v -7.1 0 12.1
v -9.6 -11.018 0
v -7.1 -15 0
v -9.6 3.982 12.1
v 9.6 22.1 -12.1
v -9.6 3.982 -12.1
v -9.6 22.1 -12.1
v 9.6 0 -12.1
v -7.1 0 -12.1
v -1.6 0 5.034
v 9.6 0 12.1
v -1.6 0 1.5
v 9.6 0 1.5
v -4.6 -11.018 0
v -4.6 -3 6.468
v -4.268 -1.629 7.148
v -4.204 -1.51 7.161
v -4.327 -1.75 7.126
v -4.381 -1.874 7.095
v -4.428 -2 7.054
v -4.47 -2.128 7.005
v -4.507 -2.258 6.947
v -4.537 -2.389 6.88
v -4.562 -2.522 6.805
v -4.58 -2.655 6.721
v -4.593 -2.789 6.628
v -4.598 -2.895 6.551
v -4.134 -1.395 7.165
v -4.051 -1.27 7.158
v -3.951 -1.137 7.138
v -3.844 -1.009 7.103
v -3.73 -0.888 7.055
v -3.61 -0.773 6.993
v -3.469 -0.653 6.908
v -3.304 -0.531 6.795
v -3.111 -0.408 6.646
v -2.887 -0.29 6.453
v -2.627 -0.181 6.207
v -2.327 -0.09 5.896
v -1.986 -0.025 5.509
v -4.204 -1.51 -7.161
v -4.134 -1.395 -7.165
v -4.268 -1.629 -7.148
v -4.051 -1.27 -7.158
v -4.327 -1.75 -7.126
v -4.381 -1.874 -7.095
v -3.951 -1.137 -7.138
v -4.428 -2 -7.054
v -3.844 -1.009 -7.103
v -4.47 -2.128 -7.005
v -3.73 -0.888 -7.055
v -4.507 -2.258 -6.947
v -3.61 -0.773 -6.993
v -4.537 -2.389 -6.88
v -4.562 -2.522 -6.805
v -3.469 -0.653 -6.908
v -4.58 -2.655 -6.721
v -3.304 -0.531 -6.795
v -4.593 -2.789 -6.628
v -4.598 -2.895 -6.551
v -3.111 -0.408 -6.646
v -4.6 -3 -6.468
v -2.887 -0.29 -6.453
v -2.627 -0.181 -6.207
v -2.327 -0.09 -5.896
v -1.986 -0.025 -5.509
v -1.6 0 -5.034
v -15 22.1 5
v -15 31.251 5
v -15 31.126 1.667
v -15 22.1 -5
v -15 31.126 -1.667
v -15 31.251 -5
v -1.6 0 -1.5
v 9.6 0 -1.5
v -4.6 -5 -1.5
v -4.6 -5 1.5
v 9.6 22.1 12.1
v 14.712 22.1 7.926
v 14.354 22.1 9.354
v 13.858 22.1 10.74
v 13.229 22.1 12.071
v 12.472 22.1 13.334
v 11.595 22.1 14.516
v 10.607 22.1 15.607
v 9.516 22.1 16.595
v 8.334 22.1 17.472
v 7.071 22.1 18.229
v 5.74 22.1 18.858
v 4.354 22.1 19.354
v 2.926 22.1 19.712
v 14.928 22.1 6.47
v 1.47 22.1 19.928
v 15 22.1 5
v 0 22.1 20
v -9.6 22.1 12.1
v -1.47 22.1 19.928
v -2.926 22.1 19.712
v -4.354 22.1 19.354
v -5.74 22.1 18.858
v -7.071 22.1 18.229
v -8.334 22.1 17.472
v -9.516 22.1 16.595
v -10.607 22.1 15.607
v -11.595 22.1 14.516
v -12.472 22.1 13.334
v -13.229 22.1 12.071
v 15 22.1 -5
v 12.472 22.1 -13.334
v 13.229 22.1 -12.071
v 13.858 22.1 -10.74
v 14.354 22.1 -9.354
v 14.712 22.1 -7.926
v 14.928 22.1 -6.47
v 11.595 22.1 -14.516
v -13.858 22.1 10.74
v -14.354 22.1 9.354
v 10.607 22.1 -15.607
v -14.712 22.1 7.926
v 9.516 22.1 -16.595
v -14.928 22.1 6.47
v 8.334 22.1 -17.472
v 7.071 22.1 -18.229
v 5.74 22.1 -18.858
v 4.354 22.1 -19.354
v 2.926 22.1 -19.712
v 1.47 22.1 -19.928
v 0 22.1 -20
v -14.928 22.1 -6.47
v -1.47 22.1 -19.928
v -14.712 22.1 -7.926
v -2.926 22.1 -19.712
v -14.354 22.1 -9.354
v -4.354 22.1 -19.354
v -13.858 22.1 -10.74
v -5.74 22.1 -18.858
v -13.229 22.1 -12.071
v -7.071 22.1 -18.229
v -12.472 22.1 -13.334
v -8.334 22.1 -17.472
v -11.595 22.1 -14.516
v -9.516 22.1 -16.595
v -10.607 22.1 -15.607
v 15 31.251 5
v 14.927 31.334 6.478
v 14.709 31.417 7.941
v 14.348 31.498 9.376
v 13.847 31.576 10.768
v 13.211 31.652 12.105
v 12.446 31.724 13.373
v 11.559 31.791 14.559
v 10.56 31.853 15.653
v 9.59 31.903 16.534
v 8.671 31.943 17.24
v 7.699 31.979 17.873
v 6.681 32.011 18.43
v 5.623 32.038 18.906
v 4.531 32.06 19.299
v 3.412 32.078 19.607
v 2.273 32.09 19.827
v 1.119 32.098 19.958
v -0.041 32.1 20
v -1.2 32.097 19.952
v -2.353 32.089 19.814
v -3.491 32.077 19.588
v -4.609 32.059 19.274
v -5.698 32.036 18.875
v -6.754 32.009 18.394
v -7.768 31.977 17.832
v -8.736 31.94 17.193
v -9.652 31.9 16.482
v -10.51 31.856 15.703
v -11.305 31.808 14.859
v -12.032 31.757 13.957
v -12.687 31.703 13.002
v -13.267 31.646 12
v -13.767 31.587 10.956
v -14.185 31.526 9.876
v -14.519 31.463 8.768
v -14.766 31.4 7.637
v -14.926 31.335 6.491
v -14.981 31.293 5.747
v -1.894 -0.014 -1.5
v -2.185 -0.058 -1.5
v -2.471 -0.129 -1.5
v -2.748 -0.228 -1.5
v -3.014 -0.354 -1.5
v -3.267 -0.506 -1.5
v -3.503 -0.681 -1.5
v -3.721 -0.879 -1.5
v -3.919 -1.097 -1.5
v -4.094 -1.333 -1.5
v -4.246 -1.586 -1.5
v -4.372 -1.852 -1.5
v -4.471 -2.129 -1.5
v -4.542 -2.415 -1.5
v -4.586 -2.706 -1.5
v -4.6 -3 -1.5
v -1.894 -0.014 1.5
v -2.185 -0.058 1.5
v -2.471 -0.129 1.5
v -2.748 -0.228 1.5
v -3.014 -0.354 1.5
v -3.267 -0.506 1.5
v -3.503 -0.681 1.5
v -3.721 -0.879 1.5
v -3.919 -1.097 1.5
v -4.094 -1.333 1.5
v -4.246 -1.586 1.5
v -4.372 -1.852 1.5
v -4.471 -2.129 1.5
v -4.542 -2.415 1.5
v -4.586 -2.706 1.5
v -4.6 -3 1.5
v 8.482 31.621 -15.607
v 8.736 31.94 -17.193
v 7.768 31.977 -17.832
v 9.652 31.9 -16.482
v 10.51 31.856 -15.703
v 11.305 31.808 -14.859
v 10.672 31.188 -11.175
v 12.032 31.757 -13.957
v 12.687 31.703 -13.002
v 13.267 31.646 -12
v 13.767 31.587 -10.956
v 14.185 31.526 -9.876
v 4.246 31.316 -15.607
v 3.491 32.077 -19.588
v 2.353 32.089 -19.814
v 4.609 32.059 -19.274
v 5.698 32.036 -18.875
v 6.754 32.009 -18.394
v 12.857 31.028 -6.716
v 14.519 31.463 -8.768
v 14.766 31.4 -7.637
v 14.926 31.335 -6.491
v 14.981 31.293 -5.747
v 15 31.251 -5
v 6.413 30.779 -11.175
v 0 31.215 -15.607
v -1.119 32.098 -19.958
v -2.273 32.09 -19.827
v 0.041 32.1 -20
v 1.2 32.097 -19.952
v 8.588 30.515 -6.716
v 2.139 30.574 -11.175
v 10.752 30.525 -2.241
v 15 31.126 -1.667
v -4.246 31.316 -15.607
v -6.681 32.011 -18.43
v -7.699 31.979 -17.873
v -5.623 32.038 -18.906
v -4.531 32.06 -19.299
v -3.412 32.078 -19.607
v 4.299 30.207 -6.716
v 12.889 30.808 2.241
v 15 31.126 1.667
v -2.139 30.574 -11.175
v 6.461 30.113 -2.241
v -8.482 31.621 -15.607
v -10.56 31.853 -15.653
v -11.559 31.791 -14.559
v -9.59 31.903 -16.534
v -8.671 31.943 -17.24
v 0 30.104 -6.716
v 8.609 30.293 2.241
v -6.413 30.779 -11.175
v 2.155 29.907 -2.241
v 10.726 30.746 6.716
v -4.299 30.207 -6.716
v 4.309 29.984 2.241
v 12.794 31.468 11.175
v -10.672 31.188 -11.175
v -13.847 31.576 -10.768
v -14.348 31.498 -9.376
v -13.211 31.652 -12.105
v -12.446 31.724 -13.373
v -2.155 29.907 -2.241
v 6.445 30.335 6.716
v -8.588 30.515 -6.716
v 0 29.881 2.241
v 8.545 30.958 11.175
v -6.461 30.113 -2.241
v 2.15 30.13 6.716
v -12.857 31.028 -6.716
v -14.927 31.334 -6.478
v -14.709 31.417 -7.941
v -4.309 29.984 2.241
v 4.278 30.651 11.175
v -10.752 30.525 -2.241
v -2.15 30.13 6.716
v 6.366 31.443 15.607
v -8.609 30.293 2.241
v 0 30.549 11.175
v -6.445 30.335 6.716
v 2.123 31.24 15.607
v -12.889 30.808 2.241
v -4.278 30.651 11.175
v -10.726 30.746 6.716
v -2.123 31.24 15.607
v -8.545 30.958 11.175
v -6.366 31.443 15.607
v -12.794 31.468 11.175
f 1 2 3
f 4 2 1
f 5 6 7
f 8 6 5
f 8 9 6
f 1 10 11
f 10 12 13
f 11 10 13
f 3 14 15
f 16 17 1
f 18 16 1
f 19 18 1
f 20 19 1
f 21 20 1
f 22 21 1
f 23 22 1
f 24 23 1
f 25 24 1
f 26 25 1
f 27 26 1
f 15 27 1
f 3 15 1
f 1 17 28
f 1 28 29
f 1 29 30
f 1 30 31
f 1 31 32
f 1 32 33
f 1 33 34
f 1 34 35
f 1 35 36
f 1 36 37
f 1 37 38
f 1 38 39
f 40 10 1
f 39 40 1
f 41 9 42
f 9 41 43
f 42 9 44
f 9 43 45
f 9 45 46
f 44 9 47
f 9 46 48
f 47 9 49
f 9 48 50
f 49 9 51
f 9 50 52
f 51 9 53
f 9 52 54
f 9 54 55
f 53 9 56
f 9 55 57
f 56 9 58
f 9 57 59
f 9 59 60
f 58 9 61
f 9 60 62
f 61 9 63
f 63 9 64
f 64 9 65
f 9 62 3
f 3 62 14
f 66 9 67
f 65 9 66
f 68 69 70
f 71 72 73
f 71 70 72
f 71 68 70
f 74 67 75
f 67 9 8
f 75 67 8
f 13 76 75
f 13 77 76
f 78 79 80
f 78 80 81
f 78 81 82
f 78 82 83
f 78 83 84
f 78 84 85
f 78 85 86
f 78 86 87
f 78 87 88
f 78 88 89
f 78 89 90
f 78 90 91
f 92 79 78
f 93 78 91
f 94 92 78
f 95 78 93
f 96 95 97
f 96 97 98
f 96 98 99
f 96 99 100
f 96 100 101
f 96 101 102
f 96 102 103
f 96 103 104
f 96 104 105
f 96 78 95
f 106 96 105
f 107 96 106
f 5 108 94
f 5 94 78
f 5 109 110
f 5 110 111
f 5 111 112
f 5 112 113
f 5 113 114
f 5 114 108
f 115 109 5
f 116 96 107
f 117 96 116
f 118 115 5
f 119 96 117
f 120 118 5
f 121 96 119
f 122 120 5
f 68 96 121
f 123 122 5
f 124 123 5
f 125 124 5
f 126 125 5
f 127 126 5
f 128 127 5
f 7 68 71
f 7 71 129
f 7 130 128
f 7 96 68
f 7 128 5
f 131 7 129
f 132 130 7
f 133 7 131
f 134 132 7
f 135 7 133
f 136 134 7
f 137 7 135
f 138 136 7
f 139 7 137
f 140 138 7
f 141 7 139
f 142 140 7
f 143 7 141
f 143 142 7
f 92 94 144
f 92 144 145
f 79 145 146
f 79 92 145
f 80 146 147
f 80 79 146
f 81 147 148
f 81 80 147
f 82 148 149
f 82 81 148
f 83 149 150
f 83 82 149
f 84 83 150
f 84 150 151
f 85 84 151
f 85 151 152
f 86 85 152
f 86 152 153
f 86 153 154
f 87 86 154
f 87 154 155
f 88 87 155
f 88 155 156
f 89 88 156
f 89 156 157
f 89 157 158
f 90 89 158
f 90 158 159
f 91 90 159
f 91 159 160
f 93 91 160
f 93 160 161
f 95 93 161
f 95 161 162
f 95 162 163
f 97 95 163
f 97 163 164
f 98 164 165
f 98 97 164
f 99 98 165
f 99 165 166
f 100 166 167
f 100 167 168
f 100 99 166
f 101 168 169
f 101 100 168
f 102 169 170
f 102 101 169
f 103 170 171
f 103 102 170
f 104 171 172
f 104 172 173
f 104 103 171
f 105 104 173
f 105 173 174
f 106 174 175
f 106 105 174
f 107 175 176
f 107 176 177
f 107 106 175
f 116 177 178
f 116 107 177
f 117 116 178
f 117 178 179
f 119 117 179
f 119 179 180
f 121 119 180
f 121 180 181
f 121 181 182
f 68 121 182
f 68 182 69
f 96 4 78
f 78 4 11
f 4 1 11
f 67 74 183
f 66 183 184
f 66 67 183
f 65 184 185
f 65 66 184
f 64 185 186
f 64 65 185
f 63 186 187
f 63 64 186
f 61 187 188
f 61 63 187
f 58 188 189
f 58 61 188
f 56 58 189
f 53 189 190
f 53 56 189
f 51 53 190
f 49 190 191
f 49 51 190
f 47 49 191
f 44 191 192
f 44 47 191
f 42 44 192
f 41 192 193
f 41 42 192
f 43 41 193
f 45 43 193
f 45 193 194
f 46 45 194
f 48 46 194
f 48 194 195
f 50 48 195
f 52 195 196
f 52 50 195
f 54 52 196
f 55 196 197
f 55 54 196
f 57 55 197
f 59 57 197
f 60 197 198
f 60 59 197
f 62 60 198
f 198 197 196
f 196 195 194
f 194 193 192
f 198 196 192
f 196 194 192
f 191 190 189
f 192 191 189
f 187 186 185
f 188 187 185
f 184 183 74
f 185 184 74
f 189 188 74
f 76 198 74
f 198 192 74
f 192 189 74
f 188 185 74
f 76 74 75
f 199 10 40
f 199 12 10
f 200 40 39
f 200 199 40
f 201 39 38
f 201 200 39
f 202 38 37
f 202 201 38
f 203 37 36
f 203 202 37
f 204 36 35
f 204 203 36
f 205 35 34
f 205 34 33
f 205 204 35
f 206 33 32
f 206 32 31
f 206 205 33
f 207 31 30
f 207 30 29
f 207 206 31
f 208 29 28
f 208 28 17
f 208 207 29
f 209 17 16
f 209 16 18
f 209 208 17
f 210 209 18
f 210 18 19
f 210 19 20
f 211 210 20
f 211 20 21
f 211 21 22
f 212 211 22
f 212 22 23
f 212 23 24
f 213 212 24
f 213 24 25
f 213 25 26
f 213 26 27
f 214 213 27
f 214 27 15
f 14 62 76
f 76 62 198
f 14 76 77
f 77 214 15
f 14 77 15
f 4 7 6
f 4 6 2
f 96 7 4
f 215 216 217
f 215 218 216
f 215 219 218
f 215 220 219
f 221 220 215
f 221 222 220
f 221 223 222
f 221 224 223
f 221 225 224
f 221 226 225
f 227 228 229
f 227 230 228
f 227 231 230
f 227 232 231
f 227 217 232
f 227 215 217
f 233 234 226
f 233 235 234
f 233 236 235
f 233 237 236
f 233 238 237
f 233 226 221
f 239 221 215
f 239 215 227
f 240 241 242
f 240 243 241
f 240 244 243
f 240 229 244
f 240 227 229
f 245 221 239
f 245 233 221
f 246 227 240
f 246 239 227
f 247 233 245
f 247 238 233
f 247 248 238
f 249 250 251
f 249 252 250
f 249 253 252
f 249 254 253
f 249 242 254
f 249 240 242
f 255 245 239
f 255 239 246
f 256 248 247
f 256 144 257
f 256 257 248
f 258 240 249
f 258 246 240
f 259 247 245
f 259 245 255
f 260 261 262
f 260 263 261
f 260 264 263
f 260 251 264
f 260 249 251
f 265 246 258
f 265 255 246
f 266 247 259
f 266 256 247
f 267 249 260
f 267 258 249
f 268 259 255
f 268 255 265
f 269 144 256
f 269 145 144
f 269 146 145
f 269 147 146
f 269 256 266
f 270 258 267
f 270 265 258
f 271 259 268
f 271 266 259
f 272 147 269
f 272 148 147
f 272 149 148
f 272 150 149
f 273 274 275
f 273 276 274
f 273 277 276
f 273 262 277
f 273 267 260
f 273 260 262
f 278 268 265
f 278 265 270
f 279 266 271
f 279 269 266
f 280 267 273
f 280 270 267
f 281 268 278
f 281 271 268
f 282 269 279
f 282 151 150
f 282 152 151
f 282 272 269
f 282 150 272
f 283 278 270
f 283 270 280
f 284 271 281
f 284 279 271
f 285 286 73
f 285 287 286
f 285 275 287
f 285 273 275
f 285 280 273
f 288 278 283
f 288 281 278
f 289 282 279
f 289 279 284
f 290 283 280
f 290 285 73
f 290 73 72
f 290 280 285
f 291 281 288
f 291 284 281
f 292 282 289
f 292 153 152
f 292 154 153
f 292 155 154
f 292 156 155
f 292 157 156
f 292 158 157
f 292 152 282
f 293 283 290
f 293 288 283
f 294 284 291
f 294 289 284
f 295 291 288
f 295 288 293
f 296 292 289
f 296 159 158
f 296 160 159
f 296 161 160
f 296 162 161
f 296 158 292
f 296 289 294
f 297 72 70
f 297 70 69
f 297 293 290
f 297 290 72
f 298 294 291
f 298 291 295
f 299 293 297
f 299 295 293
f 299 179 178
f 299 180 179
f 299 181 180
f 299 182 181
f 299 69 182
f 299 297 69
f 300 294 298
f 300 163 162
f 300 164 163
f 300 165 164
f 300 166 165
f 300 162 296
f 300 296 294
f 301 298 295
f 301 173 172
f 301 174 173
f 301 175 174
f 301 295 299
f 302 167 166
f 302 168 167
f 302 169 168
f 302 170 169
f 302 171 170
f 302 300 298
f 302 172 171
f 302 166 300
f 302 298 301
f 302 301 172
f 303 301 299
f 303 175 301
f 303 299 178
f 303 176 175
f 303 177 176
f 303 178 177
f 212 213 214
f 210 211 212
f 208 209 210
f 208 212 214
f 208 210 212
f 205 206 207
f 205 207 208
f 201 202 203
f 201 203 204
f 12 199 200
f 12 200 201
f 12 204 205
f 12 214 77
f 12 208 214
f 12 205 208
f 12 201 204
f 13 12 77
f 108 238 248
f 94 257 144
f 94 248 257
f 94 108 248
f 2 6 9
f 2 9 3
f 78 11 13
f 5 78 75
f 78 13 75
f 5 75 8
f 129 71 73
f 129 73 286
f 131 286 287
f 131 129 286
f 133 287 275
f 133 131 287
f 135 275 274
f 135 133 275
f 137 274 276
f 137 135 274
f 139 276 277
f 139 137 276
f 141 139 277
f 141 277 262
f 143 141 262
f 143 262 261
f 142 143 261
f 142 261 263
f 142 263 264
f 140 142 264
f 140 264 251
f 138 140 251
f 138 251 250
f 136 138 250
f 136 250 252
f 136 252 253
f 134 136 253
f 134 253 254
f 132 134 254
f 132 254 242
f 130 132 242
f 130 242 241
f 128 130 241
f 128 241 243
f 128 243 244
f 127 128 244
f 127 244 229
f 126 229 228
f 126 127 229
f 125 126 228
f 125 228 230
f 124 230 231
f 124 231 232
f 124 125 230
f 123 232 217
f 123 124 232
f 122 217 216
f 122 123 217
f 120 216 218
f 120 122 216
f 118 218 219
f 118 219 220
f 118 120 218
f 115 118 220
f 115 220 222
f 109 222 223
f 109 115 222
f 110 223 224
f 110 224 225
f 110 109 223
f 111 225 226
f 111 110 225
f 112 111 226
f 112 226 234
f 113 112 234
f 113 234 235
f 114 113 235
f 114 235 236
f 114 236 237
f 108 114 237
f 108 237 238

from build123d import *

# Parameters (mm, degrees)
SKETCH1_W           = 19.2
SKETCH1_H           = 24.2
BOSS_EXTRUDE1_DEPTH = 22.1
BOSS_EXTRUDE2_DEPTH = 10
BOSS_EXTRUDE3_DEPTH = 5
BOSS_EXTRUDE4_DEPTH = 1.5
CHAMFER1_SIZE       = 2.5
FILLET1_R           = 3


with BuildPart() as part:
    # Sketch1 → Boss-Extrude1 (new body)
    with BuildSketch(Plane(origin=(0, 0, 0), x_dir=(1, 0, 0), z_dir=(0, 1, 0))):
        Rectangle(SKETCH1_W, SKETCH1_H)
    extrude(amount=BOSS_EXTRUDE1_DEPTH)

    # Sketch2 → Boss-Extrude2 (add)
    with BuildSketch(Plane(origin=(0, 22.1, 0), x_dir=(1, 0, 0), z_dir=(0, 1, 0))):
        with BuildLine():
            Line((15, 5), (15, -5))
            ThreePointArc((15, -5), (0, -20), (-15, -5))
            Line((-15, -5), (-15, 5))
            ThreePointArc((-15, 5), (0, 20), (15, 5))
        make_face()
    extrude(amount=BOSS_EXTRUDE2_DEPTH)

    # Sketch4 → Boss-Extrude3 (add)
    with BuildSketch(Plane.ZY.offset(9.6)):
        Polygon((-12.1, 0), (0, -15), (12.1, 0), align=None)
    extrude(amount=-BOSS_EXTRUDE3_DEPTH)

    # Sketch6 → Boss-Extrude4 (add, symmetric)
    with BuildSketch(Plane.XY):
        Polygon((-4.6, -5), (9.6, 0), (-4.6, 0), align=None)
    extrude(amount=BOSS_EXTRUDE4_DEPTH, both=True)

    # Chamfer1
    chamfer1_edges = [part.edges().sort_by_distance(p)[0] for p in [
        (-9.6, -7.5, -6.05),
        (-4.6, -7.5, -6.05),
        (-9.6, -7.5, 6.05),
        (-4.6, -7.5, 6.05),
    ]]
    chamfer(chamfer1_edges, length=CHAMFER1_SIZE - 0.0001)  # a hair under: the kernel refuses the full size

    # Fillet1
    fillet1_edges = [part.edges().sort_by_distance(p)[0] for p in [
        (-4.6, 0, -5.194064205),
        (-4.6, 0, 5.194064205),
    ]]
    fillet(fillet1_edges, radius=FILLET1_R)

    # Sketch8 → Cut-Revolve3 (revolve, cut)
    with BuildSketch(Plane(origin=(0, 0, 0), x_dir=(0, 0, -1), z_dir=(1, 0, 0))):
        with BuildLine():
            Line((-90.14660282, 120), (90.14660282, 120))
            ThreePointArc((90.14660282, 120), (0, 29.85339718), (-90.14660282, 120))
        make_face()
    revolve(axis=Axis((0, 120, 90.14660282), (0, 0, -1)), mode=Mode.SUBTRACT)


solid = part.part
